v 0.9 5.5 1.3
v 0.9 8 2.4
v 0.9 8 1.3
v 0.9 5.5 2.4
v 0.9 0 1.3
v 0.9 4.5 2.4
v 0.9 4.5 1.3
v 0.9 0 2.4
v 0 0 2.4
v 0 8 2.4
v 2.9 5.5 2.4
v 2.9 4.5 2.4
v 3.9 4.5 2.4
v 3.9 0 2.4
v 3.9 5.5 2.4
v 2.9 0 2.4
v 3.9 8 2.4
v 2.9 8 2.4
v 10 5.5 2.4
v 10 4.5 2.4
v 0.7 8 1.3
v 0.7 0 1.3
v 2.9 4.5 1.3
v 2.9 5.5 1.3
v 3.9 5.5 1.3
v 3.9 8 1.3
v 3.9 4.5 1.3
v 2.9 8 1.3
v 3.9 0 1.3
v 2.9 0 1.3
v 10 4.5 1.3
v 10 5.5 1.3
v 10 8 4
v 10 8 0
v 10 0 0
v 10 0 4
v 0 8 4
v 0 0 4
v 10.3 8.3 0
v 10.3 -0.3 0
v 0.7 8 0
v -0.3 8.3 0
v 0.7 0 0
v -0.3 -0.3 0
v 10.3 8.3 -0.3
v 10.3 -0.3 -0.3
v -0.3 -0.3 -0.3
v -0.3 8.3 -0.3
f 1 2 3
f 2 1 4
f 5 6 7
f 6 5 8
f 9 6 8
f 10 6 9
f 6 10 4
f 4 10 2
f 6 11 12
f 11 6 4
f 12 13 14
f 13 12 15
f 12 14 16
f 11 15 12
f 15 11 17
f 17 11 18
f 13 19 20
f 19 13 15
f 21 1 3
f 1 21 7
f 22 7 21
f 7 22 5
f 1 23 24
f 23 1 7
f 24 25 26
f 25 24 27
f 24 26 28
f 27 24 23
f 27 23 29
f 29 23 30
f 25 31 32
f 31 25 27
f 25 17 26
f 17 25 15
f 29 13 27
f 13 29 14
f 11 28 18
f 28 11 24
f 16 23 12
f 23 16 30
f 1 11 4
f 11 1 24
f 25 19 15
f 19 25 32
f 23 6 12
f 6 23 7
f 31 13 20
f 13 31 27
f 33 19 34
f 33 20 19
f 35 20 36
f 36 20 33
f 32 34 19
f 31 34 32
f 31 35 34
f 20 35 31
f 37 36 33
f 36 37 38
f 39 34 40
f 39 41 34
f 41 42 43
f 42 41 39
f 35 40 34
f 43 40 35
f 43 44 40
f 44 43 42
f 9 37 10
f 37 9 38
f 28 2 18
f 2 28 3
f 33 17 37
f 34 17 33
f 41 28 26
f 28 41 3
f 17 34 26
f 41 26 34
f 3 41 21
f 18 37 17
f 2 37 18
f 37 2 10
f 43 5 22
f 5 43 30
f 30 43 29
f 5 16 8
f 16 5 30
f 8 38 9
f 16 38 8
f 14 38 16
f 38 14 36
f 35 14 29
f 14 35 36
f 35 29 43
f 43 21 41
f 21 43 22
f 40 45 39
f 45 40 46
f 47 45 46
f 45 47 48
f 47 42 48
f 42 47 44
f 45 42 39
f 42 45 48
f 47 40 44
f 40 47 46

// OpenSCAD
// 民居 (battle_house) — 和平精英/三角洲风格 可进入小楼
// 真实门洞(可进) + 前后/侧面窗洞(可穿窗射击) + 人字屋顶
$fn = 4;

module house() {
  w = 10; d = 8; h = 4;

  // 墙体：开方形门洞 + 窗洞（difference 真正挖空）
  color([0.82, 0.78, 0.70])
    difference() {
      cube([w, d, h]);
      // 正门（前 +y 面，贯穿，可进入）
      translate([-0.7, -0.3, 0]) cube([1.4, d + 0.6, 2.2]);
      // 前/后 窗洞（贯穿前后墙）
      for (x = [-3.0, 0.4, 3.4])
        translate([x - 0.5, -0.3, 1.3]) cube([1.0, d + 0.6, 1.1]);
      // 侧窗洞（贯穿两侧墙）
      for (y = [-1.0, 5.0])
        translate([-0.3, y - 0.5, 1.3]) cube([w + 0.6, 1.0, 1.1]);
    }

  // 地基
  color([0.62, 0.60, 0.56]) translate([-0.3, -0.3, -0.3]) cube([w + 0.6, d + 0.6, 0.3]);

  // 人字屋顶
  color([0.55, 0.32, 0.28])
    polyhedron(
      points = [
        [-w/2 - 0.4, -d/2 - 0.4, h], [w/2 + 0.4, -d/2 - 0.4, h],
        [w/2 + 0.4, d/2 + 0.4, h], [-w/2 - 0.4, d/2 + 0.4, h],
        [-w/2 - 0.4, 0, h + 2.2], [w/2 + 0.4, 0, h + 2.2]
      ],
      faces = [[0,1,5,4],[3,2,5,4],[0,3,4],[1,2,5],[0,1,2,3]]
    );
}

house();
